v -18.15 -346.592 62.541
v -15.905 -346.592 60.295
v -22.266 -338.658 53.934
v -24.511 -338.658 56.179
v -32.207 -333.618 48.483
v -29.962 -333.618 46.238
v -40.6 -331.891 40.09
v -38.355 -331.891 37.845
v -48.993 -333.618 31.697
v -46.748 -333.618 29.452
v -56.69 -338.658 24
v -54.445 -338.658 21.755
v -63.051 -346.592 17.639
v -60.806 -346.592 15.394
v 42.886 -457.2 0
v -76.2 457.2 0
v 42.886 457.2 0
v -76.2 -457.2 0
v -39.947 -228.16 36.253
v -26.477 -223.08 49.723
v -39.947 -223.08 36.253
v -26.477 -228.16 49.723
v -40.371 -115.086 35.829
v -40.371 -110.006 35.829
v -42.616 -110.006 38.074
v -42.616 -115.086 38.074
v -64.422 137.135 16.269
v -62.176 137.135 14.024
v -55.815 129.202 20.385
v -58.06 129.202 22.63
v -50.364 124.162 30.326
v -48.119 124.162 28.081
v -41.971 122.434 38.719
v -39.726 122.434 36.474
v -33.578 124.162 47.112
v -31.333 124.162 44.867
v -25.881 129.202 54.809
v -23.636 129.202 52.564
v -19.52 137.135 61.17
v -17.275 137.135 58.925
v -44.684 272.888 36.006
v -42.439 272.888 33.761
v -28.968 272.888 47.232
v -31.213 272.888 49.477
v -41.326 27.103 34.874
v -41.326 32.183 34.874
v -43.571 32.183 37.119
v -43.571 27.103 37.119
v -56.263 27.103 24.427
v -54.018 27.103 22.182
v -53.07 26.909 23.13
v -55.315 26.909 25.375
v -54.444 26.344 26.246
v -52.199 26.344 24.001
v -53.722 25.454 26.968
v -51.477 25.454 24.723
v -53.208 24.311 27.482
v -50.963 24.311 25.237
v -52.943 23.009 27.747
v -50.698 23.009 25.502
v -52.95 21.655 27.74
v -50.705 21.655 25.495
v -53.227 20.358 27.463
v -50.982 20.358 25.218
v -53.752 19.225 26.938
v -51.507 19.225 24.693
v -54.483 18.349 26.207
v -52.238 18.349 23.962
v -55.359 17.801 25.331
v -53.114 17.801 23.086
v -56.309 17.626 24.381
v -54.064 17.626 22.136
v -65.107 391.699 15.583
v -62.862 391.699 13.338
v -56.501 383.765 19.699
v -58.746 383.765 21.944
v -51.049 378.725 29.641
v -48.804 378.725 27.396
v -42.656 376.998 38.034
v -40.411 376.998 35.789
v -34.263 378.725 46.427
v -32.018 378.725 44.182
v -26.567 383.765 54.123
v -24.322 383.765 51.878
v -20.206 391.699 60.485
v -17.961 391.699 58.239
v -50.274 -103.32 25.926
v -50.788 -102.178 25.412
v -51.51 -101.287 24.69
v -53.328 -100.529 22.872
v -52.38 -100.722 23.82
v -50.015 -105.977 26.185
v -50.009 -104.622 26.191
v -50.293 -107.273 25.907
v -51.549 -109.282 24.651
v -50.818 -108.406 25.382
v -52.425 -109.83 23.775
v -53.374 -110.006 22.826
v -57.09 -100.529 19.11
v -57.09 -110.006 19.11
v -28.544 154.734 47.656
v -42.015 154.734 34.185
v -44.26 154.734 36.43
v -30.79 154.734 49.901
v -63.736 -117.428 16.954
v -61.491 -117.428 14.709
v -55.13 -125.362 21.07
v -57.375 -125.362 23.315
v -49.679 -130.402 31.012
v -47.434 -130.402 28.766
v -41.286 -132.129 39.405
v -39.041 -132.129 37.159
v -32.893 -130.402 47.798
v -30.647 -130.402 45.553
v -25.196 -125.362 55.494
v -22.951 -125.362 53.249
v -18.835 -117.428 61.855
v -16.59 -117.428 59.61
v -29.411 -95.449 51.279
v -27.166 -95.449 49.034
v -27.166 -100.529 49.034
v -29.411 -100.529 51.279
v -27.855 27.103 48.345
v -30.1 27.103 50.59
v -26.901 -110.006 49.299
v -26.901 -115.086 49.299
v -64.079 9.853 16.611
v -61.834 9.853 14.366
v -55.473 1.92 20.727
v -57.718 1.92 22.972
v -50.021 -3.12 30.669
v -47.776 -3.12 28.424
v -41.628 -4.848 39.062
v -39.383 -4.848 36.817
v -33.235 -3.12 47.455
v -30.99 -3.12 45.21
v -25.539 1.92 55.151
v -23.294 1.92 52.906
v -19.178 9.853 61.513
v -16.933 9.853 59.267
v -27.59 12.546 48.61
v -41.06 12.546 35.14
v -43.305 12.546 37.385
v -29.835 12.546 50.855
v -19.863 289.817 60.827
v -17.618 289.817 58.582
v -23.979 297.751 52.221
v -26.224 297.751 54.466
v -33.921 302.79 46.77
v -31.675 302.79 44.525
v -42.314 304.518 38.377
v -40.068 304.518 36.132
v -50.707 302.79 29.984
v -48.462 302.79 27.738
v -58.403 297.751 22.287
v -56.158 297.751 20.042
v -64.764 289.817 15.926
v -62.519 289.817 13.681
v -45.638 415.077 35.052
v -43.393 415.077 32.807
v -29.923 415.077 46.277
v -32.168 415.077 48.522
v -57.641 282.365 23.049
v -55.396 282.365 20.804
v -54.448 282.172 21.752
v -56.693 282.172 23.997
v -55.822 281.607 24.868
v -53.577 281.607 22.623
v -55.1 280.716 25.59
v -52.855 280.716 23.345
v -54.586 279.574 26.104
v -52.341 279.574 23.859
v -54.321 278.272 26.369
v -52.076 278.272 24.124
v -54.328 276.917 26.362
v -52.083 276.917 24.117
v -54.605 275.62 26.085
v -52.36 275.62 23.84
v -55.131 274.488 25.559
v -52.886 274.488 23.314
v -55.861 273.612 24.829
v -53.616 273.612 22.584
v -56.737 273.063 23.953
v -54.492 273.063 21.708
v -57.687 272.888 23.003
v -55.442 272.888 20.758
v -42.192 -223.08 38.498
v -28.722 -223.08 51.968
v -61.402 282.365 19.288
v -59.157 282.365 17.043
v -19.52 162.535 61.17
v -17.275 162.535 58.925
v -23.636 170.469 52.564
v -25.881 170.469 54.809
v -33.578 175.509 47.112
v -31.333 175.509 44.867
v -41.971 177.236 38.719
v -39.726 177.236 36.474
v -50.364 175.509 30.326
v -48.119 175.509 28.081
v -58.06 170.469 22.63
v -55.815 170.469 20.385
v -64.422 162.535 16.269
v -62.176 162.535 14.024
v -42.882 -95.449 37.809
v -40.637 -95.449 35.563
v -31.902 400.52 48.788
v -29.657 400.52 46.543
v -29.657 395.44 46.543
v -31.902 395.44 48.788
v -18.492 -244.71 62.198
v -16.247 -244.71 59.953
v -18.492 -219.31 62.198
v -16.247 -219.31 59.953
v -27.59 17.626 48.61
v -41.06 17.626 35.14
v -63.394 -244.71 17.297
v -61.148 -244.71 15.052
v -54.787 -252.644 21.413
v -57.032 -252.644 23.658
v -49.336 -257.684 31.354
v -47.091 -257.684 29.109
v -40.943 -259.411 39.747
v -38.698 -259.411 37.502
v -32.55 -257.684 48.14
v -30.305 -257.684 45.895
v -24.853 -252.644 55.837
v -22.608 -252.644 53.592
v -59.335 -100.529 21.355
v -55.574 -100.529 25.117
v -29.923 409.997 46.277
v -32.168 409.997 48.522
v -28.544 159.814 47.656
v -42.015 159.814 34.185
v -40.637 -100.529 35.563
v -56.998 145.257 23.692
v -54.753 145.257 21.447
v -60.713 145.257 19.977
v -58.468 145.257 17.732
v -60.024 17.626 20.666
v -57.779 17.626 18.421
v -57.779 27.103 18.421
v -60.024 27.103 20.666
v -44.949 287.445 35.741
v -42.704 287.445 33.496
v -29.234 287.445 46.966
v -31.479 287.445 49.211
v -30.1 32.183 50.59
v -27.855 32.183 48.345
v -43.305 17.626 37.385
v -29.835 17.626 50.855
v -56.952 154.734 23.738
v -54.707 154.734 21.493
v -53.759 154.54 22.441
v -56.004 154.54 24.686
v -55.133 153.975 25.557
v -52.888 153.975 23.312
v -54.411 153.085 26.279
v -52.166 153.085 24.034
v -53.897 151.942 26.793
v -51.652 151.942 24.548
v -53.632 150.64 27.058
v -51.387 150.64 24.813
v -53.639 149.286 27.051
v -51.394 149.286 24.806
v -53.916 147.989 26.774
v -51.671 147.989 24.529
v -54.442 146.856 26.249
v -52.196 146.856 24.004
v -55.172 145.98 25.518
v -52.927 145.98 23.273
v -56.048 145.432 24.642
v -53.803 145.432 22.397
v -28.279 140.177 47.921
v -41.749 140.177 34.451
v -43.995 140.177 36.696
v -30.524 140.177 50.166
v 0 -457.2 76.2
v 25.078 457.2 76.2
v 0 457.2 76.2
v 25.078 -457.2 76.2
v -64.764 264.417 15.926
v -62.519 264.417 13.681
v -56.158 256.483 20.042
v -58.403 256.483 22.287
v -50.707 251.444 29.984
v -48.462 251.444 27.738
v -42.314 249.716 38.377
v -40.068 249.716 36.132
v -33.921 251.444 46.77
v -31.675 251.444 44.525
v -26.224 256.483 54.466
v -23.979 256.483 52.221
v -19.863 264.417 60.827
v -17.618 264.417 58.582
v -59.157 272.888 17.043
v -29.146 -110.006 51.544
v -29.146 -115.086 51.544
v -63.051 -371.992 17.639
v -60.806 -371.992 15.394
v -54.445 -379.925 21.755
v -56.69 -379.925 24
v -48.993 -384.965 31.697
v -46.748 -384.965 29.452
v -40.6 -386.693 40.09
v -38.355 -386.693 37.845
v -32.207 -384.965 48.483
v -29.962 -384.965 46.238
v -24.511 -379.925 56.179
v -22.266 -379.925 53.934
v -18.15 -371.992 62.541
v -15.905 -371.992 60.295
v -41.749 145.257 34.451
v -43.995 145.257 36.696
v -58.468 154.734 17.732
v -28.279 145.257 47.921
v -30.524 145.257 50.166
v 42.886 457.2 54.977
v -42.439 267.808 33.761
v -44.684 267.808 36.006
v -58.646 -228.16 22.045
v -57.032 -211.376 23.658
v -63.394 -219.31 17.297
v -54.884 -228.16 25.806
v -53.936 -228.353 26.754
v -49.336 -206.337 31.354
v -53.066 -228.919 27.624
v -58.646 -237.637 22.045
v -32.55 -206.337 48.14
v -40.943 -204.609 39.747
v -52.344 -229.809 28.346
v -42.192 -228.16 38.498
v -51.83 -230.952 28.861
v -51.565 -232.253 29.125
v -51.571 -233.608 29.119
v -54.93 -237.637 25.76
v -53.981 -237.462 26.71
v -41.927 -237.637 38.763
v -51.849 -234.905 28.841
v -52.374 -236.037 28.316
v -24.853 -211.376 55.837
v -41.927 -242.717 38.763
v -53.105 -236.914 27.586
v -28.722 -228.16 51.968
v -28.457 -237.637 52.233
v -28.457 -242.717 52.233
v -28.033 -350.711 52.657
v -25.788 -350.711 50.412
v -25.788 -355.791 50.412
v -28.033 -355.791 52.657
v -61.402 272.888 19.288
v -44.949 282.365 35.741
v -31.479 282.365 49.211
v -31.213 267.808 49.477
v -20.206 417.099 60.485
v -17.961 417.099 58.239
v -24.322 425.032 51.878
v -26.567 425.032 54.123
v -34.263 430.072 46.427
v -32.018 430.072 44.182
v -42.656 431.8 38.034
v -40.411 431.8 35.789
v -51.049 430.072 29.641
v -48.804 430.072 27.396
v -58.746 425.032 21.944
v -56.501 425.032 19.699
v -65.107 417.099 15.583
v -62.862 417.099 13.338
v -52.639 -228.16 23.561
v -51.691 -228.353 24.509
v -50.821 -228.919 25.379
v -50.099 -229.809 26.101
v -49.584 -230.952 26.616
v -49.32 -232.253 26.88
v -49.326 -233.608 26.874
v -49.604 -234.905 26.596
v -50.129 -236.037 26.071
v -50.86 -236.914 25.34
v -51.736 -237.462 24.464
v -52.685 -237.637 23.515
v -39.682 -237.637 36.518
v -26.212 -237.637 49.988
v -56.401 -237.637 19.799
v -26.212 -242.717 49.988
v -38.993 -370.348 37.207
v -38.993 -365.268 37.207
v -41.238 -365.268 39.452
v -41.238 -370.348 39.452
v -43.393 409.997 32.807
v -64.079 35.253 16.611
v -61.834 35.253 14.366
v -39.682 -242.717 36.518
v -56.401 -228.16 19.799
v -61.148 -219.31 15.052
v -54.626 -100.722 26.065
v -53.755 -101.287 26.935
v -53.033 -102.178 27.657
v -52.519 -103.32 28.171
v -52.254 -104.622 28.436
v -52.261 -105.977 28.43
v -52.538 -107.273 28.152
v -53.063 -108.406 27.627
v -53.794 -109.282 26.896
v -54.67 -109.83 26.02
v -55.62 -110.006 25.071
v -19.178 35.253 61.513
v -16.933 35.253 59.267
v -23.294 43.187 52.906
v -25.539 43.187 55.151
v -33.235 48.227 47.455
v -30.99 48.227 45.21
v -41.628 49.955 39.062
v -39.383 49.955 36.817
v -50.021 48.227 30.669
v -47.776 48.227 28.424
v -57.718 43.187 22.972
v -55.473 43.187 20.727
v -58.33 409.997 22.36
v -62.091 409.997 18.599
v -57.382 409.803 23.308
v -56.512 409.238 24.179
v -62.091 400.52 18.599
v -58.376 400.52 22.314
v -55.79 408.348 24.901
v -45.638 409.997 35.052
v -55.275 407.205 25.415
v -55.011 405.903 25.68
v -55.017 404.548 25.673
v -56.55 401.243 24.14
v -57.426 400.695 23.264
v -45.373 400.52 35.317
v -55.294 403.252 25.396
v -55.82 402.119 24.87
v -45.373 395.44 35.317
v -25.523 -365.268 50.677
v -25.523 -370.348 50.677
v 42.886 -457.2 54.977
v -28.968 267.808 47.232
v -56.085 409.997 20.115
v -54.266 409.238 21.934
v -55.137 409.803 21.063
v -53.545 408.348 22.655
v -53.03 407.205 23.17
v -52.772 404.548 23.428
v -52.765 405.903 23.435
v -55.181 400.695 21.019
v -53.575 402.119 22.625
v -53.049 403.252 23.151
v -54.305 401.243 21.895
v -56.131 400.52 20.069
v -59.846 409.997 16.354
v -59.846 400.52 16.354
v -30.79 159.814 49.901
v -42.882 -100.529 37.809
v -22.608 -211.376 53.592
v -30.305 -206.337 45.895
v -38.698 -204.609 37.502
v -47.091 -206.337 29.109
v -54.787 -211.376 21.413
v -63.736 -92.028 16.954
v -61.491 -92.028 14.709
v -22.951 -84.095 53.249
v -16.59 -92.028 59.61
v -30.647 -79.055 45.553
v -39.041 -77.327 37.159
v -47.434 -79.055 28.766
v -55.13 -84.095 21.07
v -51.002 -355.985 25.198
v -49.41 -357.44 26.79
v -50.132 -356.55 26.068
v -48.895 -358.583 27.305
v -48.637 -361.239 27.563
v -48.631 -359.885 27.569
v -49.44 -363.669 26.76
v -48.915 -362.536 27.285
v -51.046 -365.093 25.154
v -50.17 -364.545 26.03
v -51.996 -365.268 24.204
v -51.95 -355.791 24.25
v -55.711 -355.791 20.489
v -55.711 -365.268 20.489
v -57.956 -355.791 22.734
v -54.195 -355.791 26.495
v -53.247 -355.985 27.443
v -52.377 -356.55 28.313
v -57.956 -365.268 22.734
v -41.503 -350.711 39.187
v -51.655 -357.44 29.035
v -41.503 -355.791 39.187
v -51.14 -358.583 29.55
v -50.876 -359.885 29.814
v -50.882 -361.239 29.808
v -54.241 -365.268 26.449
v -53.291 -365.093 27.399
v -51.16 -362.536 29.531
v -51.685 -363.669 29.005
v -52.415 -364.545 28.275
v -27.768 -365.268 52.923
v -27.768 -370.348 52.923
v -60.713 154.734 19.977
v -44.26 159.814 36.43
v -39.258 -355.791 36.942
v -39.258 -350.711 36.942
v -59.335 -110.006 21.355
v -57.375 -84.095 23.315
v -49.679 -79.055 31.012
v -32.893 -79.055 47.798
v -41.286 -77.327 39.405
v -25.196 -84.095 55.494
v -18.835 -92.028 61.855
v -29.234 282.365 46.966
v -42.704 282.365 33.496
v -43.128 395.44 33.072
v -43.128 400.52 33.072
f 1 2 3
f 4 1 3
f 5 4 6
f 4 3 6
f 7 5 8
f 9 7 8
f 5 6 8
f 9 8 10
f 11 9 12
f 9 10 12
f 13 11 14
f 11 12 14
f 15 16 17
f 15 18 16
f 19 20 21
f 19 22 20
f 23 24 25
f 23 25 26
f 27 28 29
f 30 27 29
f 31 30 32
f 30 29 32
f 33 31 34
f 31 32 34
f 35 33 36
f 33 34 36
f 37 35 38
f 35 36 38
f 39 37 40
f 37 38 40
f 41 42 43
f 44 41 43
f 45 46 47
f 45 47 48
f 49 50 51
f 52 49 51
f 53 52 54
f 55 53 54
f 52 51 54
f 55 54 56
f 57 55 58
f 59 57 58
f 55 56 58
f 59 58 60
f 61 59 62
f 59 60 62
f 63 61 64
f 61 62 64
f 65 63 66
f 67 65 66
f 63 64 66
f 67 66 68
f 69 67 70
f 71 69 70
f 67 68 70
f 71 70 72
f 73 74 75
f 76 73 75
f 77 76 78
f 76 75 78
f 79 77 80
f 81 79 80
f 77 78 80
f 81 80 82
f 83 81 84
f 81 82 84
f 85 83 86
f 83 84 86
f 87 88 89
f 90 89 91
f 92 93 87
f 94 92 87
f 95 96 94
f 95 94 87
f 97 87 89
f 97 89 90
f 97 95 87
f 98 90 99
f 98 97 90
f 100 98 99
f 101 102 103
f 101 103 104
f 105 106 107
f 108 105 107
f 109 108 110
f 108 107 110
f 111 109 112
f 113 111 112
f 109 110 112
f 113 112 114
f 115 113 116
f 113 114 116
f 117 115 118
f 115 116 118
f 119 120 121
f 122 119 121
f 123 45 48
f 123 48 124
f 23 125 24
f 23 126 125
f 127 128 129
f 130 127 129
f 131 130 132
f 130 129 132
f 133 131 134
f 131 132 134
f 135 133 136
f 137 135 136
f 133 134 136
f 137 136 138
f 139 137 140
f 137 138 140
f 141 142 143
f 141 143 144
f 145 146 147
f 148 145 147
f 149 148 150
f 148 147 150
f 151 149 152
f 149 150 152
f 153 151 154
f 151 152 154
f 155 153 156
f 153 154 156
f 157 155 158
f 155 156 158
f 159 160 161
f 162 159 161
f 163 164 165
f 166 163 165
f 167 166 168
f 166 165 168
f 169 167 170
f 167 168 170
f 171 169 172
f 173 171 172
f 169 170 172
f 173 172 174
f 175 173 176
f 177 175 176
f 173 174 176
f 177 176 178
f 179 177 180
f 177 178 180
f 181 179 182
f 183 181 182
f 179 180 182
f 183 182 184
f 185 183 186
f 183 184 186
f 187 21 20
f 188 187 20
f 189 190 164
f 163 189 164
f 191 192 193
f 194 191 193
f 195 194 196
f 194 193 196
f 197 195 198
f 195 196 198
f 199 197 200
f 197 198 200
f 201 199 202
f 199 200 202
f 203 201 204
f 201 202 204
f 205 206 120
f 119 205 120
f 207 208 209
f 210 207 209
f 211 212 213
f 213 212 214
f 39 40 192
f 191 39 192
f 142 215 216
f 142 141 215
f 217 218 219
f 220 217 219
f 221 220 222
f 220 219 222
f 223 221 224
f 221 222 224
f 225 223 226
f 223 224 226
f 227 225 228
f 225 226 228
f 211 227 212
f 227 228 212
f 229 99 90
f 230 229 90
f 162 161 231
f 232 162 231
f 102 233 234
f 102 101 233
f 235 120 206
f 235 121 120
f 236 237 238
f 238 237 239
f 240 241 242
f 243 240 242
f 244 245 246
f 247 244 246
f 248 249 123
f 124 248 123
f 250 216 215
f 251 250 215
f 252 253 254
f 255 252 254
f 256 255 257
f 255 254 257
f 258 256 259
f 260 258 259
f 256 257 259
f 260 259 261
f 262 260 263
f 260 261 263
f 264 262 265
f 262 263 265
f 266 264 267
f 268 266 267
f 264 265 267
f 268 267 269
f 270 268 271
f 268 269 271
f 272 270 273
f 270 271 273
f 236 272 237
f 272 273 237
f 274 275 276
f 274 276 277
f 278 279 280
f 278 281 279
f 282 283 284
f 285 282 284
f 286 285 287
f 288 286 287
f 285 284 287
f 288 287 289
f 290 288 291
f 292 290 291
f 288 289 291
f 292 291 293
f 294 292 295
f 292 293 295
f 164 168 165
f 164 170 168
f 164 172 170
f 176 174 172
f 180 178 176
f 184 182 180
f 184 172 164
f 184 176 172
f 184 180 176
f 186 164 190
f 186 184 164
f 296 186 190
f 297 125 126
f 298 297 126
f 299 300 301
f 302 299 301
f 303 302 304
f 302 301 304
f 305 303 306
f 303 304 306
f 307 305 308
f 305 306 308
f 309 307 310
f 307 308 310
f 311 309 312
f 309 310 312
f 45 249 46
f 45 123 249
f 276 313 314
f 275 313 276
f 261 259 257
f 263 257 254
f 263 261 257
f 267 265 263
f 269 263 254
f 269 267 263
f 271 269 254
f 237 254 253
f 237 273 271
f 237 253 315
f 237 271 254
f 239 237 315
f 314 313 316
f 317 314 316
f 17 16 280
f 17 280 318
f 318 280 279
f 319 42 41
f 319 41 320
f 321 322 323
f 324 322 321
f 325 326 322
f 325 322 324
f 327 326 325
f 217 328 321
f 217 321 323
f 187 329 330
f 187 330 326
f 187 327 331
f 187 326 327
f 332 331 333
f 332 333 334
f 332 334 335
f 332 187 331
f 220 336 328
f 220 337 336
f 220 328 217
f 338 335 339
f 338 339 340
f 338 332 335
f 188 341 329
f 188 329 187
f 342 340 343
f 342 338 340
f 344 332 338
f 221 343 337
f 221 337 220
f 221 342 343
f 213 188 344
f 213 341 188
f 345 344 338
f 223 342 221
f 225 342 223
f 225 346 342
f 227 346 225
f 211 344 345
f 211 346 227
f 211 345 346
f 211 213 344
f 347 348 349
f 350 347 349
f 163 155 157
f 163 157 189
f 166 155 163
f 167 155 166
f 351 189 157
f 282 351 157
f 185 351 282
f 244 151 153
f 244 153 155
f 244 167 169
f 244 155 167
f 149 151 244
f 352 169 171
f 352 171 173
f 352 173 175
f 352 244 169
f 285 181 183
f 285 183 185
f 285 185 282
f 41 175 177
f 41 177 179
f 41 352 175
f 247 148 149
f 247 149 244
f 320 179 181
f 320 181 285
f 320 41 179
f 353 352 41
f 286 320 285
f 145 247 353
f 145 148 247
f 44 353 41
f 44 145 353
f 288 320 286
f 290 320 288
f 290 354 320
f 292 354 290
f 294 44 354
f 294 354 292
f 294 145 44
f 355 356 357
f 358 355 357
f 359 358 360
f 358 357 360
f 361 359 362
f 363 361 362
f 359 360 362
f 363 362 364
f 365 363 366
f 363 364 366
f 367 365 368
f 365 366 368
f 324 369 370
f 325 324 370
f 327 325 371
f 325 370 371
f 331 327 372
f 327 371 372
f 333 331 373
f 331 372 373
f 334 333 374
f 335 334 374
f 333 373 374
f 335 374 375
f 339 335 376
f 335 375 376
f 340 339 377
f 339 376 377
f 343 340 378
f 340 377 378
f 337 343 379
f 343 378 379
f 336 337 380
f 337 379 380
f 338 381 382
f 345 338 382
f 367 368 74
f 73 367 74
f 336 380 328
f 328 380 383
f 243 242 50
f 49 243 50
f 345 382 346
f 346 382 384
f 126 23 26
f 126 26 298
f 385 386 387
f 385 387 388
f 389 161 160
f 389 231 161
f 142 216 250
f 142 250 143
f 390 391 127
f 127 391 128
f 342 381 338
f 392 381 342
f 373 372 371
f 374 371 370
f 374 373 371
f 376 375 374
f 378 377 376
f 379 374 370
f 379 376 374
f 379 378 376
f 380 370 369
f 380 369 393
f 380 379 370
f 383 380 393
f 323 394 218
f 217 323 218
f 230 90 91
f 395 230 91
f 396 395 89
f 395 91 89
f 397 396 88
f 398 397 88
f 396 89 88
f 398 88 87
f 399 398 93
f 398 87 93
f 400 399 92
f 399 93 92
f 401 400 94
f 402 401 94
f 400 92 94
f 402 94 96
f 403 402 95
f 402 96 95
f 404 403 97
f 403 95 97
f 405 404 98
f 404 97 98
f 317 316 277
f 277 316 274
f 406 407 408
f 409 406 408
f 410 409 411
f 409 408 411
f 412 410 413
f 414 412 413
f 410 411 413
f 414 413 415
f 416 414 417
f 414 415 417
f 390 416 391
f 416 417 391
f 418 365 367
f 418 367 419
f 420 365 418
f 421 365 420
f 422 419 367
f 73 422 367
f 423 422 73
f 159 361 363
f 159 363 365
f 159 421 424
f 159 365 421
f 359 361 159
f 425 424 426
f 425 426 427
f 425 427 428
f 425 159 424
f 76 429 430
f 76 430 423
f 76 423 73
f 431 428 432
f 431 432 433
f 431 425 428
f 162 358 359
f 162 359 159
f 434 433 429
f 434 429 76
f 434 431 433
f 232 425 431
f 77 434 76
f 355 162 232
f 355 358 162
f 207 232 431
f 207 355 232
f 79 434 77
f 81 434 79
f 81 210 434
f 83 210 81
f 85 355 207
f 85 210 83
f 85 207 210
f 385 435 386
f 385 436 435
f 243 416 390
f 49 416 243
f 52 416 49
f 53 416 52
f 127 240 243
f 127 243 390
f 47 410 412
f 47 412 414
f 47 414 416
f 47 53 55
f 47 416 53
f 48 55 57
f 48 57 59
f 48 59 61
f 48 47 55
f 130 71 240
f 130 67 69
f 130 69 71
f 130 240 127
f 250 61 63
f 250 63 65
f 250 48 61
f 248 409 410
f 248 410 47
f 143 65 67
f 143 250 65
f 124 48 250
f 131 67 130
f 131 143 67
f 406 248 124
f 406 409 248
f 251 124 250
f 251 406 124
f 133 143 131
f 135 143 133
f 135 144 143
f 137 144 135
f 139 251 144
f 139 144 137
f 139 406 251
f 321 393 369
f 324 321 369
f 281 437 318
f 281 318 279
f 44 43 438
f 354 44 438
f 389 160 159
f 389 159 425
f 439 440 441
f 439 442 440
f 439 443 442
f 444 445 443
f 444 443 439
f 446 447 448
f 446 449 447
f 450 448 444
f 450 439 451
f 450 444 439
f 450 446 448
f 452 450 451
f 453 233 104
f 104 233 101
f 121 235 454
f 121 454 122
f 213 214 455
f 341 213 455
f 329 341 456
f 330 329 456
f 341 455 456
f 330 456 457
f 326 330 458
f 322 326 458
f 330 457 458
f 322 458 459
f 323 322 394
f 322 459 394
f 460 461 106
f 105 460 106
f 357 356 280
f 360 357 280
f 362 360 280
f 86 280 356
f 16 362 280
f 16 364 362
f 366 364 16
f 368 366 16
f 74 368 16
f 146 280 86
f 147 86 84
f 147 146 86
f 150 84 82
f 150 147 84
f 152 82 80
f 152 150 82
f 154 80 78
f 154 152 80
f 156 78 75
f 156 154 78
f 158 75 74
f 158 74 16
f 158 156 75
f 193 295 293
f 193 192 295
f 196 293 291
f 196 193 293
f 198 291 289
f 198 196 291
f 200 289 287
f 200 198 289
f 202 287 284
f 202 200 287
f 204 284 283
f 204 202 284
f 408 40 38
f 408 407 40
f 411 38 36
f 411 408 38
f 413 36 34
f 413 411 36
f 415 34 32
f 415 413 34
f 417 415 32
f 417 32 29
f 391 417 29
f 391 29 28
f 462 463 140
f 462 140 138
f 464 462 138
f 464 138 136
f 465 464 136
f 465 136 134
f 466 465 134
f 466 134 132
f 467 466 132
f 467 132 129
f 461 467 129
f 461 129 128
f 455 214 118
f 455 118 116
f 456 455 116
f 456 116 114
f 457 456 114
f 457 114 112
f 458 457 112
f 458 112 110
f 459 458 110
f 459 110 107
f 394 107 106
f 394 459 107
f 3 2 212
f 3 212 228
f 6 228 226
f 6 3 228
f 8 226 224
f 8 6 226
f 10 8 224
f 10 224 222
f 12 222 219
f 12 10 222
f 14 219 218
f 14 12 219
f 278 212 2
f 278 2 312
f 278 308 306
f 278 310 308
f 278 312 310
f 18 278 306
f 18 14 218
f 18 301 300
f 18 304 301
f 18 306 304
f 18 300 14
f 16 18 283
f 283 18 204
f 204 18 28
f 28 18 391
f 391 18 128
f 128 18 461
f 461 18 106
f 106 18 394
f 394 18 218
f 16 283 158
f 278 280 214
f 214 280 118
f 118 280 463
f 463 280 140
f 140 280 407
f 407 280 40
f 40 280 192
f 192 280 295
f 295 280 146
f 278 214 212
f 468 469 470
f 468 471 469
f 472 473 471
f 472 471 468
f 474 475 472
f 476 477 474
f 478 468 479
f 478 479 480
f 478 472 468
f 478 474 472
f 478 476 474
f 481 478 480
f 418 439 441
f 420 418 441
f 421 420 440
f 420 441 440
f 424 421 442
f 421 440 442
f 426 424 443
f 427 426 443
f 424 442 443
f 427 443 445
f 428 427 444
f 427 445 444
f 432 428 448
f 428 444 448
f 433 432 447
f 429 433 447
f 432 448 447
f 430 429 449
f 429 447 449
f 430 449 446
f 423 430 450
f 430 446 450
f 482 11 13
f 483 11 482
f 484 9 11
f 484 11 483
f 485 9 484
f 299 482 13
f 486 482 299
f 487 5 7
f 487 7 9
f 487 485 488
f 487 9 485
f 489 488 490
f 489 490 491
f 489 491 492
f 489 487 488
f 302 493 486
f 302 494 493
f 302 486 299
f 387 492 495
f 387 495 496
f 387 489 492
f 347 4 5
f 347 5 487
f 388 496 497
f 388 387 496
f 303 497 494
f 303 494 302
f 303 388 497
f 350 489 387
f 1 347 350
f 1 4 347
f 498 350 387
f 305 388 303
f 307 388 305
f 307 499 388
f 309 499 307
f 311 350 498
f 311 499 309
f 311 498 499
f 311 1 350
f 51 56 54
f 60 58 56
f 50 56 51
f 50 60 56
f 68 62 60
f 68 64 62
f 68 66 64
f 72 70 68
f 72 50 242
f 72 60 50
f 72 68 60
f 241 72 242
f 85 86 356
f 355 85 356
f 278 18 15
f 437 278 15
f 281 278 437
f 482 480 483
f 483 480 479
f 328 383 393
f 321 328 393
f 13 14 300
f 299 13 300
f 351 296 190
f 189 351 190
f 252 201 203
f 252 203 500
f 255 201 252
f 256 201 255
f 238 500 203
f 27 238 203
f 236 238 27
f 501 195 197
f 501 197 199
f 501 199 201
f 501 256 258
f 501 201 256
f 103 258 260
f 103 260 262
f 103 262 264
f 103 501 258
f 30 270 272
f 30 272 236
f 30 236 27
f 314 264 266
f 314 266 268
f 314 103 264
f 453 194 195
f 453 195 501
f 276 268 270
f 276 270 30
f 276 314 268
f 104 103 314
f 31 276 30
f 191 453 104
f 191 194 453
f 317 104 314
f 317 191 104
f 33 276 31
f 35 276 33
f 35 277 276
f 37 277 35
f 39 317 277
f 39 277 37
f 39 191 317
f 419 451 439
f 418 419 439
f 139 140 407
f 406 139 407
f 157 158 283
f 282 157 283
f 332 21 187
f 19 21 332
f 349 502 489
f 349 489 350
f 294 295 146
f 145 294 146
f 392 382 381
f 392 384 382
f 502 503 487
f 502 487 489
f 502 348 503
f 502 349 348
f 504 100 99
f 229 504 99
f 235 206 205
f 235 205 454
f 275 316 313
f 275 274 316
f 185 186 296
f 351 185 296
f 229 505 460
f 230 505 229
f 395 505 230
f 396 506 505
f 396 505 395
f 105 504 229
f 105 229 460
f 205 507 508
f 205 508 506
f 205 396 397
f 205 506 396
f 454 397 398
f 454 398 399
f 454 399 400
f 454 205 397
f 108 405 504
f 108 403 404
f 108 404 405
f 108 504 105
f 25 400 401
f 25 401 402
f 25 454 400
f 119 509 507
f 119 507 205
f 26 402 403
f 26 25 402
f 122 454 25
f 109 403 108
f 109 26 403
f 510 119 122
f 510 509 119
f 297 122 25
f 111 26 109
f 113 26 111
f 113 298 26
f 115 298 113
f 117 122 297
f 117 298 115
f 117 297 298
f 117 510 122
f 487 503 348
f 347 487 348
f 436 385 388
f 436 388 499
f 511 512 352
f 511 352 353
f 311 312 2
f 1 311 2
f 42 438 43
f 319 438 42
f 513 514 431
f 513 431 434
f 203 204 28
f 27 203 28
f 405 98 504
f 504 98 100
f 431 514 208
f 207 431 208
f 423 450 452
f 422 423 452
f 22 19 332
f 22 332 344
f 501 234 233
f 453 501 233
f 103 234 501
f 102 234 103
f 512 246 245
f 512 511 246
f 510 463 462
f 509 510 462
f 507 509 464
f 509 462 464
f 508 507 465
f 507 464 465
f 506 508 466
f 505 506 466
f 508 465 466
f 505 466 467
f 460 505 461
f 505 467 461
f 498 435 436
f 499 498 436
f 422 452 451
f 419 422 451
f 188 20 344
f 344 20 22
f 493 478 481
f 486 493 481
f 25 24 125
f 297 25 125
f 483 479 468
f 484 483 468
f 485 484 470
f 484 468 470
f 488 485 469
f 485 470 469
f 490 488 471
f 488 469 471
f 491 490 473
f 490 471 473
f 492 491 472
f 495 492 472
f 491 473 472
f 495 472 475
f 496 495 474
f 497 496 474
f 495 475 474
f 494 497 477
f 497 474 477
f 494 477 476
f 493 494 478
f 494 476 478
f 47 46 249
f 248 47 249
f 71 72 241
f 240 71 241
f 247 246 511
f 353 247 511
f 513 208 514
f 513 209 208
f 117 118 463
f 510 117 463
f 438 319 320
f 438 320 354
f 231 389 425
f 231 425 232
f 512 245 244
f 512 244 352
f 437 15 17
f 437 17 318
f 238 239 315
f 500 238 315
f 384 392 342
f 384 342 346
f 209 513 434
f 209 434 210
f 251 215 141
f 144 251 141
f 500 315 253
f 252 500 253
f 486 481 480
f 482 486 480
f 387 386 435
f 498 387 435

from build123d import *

# Parameters (mm, degrees)
F1_DEPTH = 457.2
F2_W     = 5.08
F2_H     = 19.05
F3_DEPTH = 3.175


# Not quite as in the source:
# - a length typed as a fraction of an inch, garbled in the dataset ("3 / 203.2 mm" for 3/8 in), is restored


with BuildPart() as f1:
    # F0 (on Front) → F1 (new body, symmetric)
    with BuildSketch(Plane.XZ):
        Polygon((-76.2, 0), (0, 0), (42.8860933474, 0), (42.8860933474, 54.9768594564), (25.0777639449, 76.2), (0, 76.2), align=None)
    extrude(amount=F1_DEPTH, both=True)

    # F2 (on face) → F3 (join)
    with BuildSketch(Plane(origin=(-38.1, 0, 38.1), x_dir=(0, -1, 0), z_dir=(-0.7071067812, 0, 0.7071067812))):
        with BuildLine():
            Line((-391.6987875515, 28.4815367264), (-417.0987875515, 28.4815367264))
            ThreePointArc((-417.0987875515, 28.4815367264), (-431.8, -3.2684632736), (-417.0987875515, -35.0184632736))
            Line((-417.0987875515, -35.0184632736), (-391.6987875515, -35.0184632736))
            ThreePointArc((-391.6987875515, -35.0184632736), (-376.9975751031, -3.2684632736), (-391.6987875515, 28.4815367264))
        make_face()
        with BuildLine():
            Line((-400.5195509719, -30.7538155466), (-409.9965240192, -30.7538155466))
            Line((-409.9965240192, -30.7538155466), (-409.9965240192, -25.4346902415))
            ThreePointArc((-409.9965240192, -25.4346902415), (-405.2253041336, -20.6960921992), (-400.5195509719, -25.4997093556))
            Line((-400.5195509719, -25.4997093556), (-400.5195509719, -30.7538155466))
        make_face(mode=Mode.SUBTRACT)
        with Locations((-412.5365240192, 2.0394300796)):
            Rectangle(F2_W, F2_H, mode=Mode.SUBTRACT)
        with Locations((-397.9795509719, 2.4147130909)):
            Rectangle(F2_W, F2_H, mode=Mode.SUBTRACT)
        with BuildLine():
            Line((-264.41702, 28.96613), (-289.81702, 28.96613))
            ThreePointArc((-289.81702, 28.96613), (-304.5182324485, -2.78387), (-289.81702, -34.53387))
            Line((-289.81702, -34.53387), (-264.41702, -34.53387))
            ThreePointArc((-264.41702, -34.53387), (-249.7158075515, -2.78387), (-264.41702, 28.96613))
        make_face()
        with BuildLine():
            Line((-272.8882718836, -29.7792267651), (-282.365244931, -29.7792267651))
            Line((-282.365244931, -29.7792267651), (-282.365244931, -24.46010146))
            ThreePointArc((-282.365244931, -24.46010146), (-277.5940250453, -19.7215034177), (-272.8882718836, -24.5251205741))
            Line((-272.8882718836, -24.5251205741), (-272.8882718836, -29.7792267651))
        make_face(mode=Mode.SUBTRACT)
        with Locations((-284.905244931, 3.0140188611)):
            Rectangle(F2_W, F2_H, mode=Mode.SUBTRACT)
        with Locations((-270.3482718836, 3.3893018724)):
            Rectangle(F2_W, F2_H, mode=Mode.SUBTRACT)
        with BuildLine():
            Line((-137.1352524485, 29.4507232736), (-162.5352524485, 29.4507232736))
            ThreePointArc((-162.5352524485, 29.4507232736), (-177.2364648969, -2.2992767264), (-162.5352524485, -34.0492767264))
            Line((-162.5352524485, -34.0492767264), (-137.1352524485, -34.0492767264))
            ThreePointArc((-137.1352524485, -34.0492767264), (-122.43404, -2.2992767264), (-137.1352524485, 29.4507232736))
        make_face()
        with BuildLine():
            Line((-145.2569927954, -28.8046379836), (-154.7339658427, -28.8046379836))
            Line((-154.7339658427, -28.8046379836), (-154.7339658427, -23.4855126785))
            ThreePointArc((-154.7339658427, -23.4855126785), (-149.962745957, -18.7469146362), (-145.2569927954, -23.5505317926))
            Line((-145.2569927954, -23.5505317926), (-145.2569927954, -28.8046379836))
        make_face(mode=Mode.SUBTRACT)
        with Locations((-157.2739658427, 3.9886076427)):
            Rectangle(F2_W, F2_H, mode=Mode.SUBTRACT)
        with Locations((-142.7169927954, 4.3638906539)):
            Rectangle(F2_W, F2_H, mode=Mode.SUBTRACT)
        with BuildLine():
            Line((-9.8534848969, 29.9353165472), (-35.2534848969, 29.9353165472))
            ThreePointArc((-35.2534848969, 29.9353165472), (-49.9546973454, -1.8146834528), (-35.2534848969, -33.5646834528))
            Line((-35.2534848969, -33.5646834528), (-9.8534848969, -33.5646834528))
            ThreePointArc((-9.8534848969, -33.5646834528), (4.8477275515, -1.8146834528), (-9.8534848969, 29.9353165472))
        make_face()
        with BuildLine():
            Line((-17.6257137071, -27.8300492021), (-27.1026867544, -27.8300492021))
            Line((-27.1026867544, -27.8300492021), (-27.1026867544, -22.5109238969))
            ThreePointArc((-27.1026867544, -22.5109238969), (-22.3314668688, -17.7723258546), (-17.6257137071, -22.575943011))
            Line((-17.6257137071, -22.575943011), (-17.6257137071, -27.8300492021))
        make_face(mode=Mode.SUBTRACT)
        with Locations((-29.6426867544, 4.9631964242)):
            Rectangle(F2_W, F2_H, mode=Mode.SUBTRACT)
        with Locations((-15.0857137071, 5.3384794355)):
            Rectangle(F2_W, F2_H, mode=Mode.SUBTRACT)
        with BuildLine():
            Line((117.4282826546, 30.4199098208), (92.0282826546, 30.4199098208))
            ThreePointArc((92.0282826546, 30.4199098208), (77.3270702061, -1.3300901792), (92.0282826546, -33.0800901792))
            Line((92.0282826546, -33.0800901792), (117.4282826546, -33.0800901792))
            ThreePointArc((117.4282826546, -33.0800901792), (132.1294951031, -1.3300901792), (117.4282826546, 30.4199098208))
        make_face()
        with BuildLine():
            Line((110.0055653812, -26.8554604205), (100.5285923338, -26.8554604205))
            Line((100.5285923338, -26.8554604205), (100.5285923338, -21.5363351154))
            ThreePointArc((100.5285923338, -21.5363351154), (105.2998122195, -16.7977370731), (110.0055653812, -21.6013542295))
            Line((110.0055653812, -21.6013542295), (110.0055653812, -26.8554604205))
        make_face(mode=Mode.SUBTRACT)
        with Locations((97.9885923338, 5.9377852057)):
            Rectangle(F2_W, F2_H, mode=Mode.SUBTRACT)
        with Locations((112.5455653812, 6.313068217)):
            Rectangle(F2_W, F2_H, mode=Mode.SUBTRACT)
        with BuildLine():
            Line((244.7100502061, 30.9045030943), (219.3100502061, 30.9045030943))
            ThreePointArc((219.3100502061, 30.9045030943), (204.6088377576, -0.8454969057), (219.3100502061, -32.5954969057))
            Line((219.3100502061, -32.5954969057), (244.7100502061, -32.5954969057))
            ThreePointArc((244.7100502061, -32.5954969057), (259.4112626546, -0.8454969057), (244.7100502061, 30.9045030943))
        make_face()
        with BuildLine():
            Line((237.6368444694, -25.880871639), (228.1598714221, -25.880871639))
            Line((228.1598714221, -25.880871639), (228.1598714221, -20.5617463339))
            ThreePointArc((228.1598714221, -20.5617463339), (232.9310913078, -15.8231482916), (237.6368444694, -20.626765448))
            Line((237.6368444694, -20.626765448), (237.6368444694, -25.880871639))
        make_face(mode=Mode.SUBTRACT)
        with Locations((225.6198714221, 6.9123739872)):
            Rectangle(F2_W, F2_H, mode=Mode.SUBTRACT)
        with Locations((240.1768444694, 7.2876569985)):
            Rectangle(F2_W, F2_H, mode=Mode.SUBTRACT)
        with BuildLine():
            Line((371.9918177576, 31.3890963679), (346.5918177576, 31.3890963679))
            ThreePointArc((346.5918177576, 31.3890963679), (331.8906053092, -0.3609036321), (346.5918177576, -32.1109036321))
            Line((346.5918177576, -32.1109036321), (371.9918177576, -32.1109036321))
            ThreePointArc((371.9918177576, -32.1109036321), (386.6930302061, -0.3609036321), (371.9918177576, 31.3890963679))
        make_face()
        with BuildLine():
            Line((365.2681235577, -24.9062828575), (355.7911505104, -24.9062828575))
            Line((355.7911505104, -24.9062828575), (355.7911505104, -19.5871575524))
            ThreePointArc((355.7911505104, -19.5871575524), (360.562370396, -14.8485595101), (365.2681235577, -19.6521766665))
            Line((365.2681235577, -19.6521766665), (365.2681235577, -24.9062828575))
        make_face(mode=Mode.SUBTRACT)
        with Locations((353.2511505104, 7.8869627688)):
            Rectangle(F2_W, F2_H, mode=Mode.SUBTRACT)
        with Locations((367.8081235577, 8.26224578)):
            Rectangle(F2_W, F2_H, mode=Mode.SUBTRACT)
    extrude(amount=F3_DEPTH)


solid = f1.part
